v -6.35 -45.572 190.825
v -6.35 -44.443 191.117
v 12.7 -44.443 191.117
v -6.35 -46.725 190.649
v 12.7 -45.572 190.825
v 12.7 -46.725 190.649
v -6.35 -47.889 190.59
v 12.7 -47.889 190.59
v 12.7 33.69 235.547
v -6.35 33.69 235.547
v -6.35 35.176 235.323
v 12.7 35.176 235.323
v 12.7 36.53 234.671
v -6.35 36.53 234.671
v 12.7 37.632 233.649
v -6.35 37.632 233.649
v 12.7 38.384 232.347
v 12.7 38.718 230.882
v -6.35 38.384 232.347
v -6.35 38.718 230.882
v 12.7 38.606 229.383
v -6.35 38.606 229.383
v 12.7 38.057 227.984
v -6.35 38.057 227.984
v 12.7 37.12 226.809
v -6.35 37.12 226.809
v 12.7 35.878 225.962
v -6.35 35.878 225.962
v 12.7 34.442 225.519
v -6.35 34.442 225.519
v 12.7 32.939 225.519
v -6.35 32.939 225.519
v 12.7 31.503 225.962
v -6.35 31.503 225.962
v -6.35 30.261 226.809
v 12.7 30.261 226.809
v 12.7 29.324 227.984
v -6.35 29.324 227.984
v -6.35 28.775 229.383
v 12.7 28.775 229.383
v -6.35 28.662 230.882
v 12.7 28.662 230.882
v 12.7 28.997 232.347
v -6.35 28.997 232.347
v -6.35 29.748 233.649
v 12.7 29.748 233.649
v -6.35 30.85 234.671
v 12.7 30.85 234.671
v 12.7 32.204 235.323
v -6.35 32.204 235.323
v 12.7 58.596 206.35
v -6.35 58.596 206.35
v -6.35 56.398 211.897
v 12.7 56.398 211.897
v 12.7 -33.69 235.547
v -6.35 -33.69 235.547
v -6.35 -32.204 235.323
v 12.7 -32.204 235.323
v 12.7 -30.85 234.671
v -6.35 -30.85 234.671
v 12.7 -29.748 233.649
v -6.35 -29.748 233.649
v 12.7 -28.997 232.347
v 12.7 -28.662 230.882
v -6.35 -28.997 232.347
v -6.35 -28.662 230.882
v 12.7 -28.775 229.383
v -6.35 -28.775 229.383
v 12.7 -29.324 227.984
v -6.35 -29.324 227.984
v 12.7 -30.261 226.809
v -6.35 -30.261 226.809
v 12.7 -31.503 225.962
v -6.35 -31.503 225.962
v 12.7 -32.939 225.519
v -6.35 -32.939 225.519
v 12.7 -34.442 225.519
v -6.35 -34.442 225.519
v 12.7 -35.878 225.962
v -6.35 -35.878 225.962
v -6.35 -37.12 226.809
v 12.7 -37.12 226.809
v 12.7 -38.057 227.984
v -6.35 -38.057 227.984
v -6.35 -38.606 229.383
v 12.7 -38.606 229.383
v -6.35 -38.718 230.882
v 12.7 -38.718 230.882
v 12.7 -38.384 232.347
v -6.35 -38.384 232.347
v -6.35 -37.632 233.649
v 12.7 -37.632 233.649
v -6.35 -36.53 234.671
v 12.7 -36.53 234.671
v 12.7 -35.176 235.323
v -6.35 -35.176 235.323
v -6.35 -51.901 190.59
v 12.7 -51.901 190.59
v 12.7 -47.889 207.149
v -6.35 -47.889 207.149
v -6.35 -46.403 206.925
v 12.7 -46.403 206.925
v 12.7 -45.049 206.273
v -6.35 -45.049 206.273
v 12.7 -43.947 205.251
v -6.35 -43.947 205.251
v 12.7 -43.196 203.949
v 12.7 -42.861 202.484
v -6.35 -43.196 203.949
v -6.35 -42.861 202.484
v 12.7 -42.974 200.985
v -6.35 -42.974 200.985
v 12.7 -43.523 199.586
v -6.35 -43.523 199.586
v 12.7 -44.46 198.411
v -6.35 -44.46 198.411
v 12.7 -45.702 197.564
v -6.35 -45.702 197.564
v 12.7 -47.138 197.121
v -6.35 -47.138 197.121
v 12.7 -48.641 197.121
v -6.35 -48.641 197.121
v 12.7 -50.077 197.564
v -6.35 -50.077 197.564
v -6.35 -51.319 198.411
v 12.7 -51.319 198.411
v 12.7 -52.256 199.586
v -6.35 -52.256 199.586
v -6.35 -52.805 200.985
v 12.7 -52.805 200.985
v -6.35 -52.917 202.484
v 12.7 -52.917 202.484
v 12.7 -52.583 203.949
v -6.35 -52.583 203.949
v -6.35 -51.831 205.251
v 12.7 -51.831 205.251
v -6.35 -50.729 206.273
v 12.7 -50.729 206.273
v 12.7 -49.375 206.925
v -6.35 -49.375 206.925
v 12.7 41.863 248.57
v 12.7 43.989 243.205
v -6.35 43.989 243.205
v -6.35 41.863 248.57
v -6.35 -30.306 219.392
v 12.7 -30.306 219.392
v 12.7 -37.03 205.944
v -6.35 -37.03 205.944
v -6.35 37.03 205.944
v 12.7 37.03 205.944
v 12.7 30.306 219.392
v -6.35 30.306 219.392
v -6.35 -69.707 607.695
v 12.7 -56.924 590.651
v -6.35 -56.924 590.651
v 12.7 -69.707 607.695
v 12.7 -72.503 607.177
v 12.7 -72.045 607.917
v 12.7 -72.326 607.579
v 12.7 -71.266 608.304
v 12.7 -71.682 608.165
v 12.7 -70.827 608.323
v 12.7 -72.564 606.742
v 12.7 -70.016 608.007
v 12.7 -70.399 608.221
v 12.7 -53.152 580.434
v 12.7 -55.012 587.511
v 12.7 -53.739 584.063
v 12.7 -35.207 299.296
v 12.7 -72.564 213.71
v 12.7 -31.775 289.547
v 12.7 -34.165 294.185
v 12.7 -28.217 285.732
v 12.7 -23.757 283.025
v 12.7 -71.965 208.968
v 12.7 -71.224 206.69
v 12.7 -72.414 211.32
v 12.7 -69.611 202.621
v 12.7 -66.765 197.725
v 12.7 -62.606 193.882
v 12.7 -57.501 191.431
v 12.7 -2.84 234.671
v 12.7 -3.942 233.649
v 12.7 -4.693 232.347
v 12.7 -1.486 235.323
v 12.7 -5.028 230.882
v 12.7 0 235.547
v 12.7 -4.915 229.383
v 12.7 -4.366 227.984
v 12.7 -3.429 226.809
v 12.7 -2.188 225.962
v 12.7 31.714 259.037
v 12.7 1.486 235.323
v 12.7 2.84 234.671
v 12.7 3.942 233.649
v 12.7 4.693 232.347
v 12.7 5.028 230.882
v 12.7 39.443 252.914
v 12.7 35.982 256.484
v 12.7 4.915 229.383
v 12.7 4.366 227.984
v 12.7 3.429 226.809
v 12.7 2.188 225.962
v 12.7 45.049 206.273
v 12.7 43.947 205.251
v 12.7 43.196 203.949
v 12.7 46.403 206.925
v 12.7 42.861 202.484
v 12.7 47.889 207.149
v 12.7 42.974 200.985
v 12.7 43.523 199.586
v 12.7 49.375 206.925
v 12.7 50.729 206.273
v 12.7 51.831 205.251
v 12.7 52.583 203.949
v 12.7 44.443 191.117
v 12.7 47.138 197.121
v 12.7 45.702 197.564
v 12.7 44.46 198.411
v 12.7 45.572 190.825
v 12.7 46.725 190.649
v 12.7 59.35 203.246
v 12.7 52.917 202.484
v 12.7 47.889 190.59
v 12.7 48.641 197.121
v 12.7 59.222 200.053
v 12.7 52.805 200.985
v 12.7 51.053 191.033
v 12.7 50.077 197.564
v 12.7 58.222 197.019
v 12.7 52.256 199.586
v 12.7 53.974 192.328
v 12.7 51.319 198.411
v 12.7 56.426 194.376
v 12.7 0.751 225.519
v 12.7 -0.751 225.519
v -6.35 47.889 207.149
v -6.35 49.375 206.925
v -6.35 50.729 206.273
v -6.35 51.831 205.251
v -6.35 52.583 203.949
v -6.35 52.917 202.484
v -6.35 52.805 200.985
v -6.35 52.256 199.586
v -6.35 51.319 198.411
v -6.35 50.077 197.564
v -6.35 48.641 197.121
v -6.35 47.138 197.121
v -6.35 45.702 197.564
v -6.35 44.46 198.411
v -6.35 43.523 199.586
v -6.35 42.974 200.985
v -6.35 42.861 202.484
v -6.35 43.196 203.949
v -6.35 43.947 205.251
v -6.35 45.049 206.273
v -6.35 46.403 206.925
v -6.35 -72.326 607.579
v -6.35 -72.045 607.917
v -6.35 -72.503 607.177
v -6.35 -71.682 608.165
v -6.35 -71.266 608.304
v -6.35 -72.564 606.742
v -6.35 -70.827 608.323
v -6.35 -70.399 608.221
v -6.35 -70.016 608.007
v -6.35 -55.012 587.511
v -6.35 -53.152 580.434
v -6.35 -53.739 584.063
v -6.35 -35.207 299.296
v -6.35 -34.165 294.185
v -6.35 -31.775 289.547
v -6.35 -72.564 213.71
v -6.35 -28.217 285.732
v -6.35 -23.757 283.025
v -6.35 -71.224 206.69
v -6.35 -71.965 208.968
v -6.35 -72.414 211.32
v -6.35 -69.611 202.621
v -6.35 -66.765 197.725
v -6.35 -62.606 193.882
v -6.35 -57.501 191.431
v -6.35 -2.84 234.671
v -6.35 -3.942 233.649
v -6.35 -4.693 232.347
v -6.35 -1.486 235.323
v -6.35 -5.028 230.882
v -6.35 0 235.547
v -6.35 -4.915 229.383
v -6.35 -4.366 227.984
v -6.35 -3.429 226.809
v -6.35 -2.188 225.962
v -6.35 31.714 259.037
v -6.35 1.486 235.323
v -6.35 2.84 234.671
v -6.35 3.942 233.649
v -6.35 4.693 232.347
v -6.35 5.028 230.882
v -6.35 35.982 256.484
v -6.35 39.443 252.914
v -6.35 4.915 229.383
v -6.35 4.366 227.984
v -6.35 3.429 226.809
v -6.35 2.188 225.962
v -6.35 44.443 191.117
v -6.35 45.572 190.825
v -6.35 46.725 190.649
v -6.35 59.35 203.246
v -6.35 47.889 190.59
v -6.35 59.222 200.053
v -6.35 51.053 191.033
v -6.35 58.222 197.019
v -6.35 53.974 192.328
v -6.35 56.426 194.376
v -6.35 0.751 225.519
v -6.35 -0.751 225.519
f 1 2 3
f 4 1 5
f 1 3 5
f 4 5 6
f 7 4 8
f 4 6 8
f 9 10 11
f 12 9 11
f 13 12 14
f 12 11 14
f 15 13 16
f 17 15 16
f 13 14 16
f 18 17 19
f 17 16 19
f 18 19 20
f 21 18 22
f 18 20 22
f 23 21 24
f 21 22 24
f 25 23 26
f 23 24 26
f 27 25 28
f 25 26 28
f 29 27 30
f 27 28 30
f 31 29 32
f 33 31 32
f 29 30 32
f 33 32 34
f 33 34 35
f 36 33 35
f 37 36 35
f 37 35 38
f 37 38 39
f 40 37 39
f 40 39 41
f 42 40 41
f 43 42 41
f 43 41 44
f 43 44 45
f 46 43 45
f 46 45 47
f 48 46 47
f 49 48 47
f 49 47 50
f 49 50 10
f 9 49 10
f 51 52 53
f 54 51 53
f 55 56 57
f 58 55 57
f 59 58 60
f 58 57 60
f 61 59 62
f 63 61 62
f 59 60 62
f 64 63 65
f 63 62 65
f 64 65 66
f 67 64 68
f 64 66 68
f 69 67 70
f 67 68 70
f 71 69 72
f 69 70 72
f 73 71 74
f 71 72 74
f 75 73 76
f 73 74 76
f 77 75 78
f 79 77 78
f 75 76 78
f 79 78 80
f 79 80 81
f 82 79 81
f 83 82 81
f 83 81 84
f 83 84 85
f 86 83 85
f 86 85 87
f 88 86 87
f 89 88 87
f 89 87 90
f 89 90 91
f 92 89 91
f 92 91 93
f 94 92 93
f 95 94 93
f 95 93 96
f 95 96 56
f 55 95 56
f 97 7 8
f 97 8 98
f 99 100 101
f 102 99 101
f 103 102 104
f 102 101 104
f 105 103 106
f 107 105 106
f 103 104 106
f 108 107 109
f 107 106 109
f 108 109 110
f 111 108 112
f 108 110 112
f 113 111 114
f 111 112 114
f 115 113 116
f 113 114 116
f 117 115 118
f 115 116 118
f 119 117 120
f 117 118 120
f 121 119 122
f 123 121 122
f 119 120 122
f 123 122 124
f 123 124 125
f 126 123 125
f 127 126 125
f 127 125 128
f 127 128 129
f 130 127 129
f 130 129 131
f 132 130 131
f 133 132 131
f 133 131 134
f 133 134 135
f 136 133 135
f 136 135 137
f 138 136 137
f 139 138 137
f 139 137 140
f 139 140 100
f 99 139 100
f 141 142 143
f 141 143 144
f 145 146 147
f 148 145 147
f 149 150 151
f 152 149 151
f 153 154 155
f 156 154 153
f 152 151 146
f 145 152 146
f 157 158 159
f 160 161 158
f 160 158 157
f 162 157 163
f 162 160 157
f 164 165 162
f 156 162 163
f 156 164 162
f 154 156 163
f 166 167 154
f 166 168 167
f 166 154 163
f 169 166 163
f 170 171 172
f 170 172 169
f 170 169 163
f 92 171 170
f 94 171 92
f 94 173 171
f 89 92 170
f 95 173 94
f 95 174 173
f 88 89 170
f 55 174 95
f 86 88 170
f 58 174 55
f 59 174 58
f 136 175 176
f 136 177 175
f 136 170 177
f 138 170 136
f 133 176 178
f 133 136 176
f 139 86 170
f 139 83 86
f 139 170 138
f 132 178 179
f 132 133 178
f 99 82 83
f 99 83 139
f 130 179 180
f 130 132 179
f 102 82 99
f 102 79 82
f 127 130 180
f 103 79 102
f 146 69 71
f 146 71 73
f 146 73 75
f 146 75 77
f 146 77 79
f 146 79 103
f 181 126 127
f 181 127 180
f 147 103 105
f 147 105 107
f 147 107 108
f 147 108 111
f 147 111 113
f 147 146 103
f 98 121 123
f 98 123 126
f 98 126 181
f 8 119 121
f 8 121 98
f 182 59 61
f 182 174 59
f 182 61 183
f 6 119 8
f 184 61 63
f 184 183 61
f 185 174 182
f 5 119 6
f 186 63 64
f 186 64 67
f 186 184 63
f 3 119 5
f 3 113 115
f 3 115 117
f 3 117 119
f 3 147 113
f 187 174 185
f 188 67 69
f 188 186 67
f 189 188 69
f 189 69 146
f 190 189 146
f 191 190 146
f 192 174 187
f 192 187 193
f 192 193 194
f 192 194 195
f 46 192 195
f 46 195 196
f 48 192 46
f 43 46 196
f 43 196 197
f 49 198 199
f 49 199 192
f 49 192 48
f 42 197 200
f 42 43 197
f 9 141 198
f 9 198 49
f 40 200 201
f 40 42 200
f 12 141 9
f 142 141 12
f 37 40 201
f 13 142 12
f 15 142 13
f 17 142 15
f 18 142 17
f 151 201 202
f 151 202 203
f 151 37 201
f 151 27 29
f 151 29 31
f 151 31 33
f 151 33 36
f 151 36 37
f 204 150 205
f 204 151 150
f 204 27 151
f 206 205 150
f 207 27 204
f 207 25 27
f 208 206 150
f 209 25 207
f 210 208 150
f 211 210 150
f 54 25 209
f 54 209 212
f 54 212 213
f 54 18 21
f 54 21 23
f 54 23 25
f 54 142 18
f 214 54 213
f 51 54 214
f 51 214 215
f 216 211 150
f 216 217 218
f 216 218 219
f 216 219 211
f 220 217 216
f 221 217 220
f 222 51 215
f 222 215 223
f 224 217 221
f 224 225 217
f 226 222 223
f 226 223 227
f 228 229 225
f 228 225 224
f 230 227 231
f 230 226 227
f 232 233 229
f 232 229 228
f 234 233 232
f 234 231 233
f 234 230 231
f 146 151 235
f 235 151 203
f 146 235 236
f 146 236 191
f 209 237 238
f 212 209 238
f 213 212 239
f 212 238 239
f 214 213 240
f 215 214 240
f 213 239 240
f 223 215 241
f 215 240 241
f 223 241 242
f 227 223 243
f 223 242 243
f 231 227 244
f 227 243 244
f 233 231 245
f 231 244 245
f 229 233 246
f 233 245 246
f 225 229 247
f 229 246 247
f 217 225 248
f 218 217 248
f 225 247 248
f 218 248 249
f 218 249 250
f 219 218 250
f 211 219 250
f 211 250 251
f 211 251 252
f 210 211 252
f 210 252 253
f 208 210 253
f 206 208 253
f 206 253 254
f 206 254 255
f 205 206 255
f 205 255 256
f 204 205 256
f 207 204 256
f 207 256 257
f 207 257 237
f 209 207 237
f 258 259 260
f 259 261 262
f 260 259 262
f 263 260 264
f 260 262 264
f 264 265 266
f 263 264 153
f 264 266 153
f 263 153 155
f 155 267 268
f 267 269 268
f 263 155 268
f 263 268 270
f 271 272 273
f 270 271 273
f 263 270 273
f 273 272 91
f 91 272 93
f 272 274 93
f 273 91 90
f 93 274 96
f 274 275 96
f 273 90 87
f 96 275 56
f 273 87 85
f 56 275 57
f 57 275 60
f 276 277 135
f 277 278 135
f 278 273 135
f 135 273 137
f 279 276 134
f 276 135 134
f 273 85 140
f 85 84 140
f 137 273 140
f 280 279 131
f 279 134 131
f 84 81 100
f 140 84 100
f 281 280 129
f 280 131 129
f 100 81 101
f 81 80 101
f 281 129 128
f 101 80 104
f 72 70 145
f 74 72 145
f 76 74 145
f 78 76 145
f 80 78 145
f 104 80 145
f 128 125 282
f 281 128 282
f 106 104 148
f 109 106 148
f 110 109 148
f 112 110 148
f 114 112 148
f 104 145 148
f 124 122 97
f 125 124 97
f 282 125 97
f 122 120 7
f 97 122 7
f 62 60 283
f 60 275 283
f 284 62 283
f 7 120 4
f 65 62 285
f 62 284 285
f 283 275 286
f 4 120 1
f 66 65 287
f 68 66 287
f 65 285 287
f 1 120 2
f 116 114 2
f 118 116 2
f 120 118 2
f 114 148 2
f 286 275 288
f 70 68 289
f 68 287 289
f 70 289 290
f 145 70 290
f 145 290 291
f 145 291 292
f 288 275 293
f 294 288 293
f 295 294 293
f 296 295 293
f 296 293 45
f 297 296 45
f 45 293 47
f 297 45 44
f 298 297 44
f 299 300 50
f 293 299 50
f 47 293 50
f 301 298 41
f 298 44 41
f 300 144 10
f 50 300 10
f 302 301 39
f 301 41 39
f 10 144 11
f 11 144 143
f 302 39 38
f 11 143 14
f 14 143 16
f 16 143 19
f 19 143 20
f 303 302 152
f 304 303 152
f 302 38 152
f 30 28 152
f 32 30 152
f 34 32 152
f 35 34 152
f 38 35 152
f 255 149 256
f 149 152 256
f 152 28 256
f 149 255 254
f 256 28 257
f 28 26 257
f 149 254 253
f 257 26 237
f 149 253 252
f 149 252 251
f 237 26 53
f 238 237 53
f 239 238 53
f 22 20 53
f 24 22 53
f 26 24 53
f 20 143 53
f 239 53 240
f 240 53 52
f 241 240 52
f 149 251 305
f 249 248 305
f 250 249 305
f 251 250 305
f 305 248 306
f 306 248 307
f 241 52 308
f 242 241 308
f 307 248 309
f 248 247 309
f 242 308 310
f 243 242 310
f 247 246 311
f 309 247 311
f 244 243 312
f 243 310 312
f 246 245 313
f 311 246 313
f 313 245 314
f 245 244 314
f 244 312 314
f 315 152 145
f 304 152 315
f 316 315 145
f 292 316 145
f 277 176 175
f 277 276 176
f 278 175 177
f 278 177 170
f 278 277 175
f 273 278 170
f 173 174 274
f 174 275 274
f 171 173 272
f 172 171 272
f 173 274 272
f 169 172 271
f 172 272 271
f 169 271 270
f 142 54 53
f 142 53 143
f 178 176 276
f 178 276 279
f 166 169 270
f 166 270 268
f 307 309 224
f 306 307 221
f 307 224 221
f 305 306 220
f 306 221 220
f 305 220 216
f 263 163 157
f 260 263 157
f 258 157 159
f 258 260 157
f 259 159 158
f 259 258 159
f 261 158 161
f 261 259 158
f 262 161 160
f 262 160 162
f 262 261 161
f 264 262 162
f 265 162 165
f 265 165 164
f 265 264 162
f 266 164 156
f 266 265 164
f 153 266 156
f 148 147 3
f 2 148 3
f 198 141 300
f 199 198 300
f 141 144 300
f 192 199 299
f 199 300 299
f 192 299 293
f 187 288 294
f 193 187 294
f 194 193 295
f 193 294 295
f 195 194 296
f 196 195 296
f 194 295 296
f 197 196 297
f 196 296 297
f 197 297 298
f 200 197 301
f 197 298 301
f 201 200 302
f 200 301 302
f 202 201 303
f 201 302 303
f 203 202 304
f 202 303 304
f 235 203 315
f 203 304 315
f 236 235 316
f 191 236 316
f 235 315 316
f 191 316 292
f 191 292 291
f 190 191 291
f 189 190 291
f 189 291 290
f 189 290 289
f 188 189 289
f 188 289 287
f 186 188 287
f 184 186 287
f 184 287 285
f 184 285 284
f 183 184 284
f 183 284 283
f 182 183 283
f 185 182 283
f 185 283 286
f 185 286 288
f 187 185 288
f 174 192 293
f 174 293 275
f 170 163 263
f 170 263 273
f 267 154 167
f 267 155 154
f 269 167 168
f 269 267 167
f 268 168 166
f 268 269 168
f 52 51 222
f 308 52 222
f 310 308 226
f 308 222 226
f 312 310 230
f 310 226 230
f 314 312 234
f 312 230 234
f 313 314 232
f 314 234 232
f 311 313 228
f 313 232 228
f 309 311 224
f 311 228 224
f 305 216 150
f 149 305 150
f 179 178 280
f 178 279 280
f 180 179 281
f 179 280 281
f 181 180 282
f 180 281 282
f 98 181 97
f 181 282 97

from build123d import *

# Parameters (mm, degrees)
SKETCH1_R               = 7.9375
SKETCH1_R_2             = 11.1125
BOSS_EXTRUDE1_DEPTH     = 12.7
F_8_CLEARANCE_HOLE1_D   = 4.4958
SKETCH5_R               = 18.415
CUT_EXTRUDE1_DEPTH      = 13.7
SKETCH7_R               = 9.525
CUT_EXTRUDE2_DEPTH      = 13.7
CUT_EXTRUDE3_DEPTH      = 13.7
BOSS_EXTRUDE2_DEPTH     = 12.7
CUT_EXTRUDE4_DEPTH      = 13.7
SKETCH11_W              = 12.7
SKETCH11_H              = 178.054
CUT_EXTRUDE5_DEPTH      = 3.175
BOSS_EXTRUDE3_DEPTH     = 19.05
CUT_EXTRUDE6_DEPTH      = 20.05
F_3_8_CLEARANCE_HOLE1_D = 10.0838
CUT_EXTRUDE7_DEPTH      = 20.05
BOSS_EXTRUDE4_DEPTH     = 19.05
FILLET1_R               = 19.05
FILLET3_R               = 1.5875


with BuildPart() as part:
    # Sketch1 → Boss-Extrude1 (new body)
    with BuildSketch(Plane(origin=(0, 0, 0), x_dir=(0, 0, -1), z_dir=(1, 0, 0))):
        with BuildLine():
            Line((93.345, 0), (55.245, 50.8))
            Line((55.245, 50.8), (-160.655, 50.8))
            ThreePointArc((-160.655, 50.8), (-211.455, 0), (-160.655, -50.8))
            Line((-160.655, -50.8), (55.245, -50.8))
            Line((55.245, -50.8), (93.345, 0))
        make_face()
        with Locations((-88.9, 0)):
            Circle(SKETCH1_R, mode=Mode.SUBTRACT)
        with Locations((-38.1, 0)):
            Circle(SKETCH1_R, mode=Mode.SUBTRACT)
        with Locations((-160.655, 0)):
            Circle(SKETCH1_R_2, mode=Mode.SUBTRACT)
        Circle(SKETCH1_R, mode=Mode.SUBTRACT)
    extrude(amount=BOSS_EXTRUDE1_DEPTH)

    # #8 Clearance Hole1 (through all)
    with Locations(Plane.ZY):
        with Locations((-17.691104559, 17.691104559), (17.691104559, 17.691104559), (17.691104559, -17.691104559), (-17.691104559, -17.691104559)):
            Hole(F_8_CLEARANCE_HOLE1_D / 2)

    # Sketch5 → Cut-Extrude1 (cut, through all)
    with BuildSketch(Plane.ZY):
        Circle(SKETCH5_R)
    extrude(amount=-CUT_EXTRUDE1_DEPTH, mode=Mode.SUBTRACT)

    # Sketch7 → Cut-Extrude2 (cut, through all)
    with BuildSketch(Plane.ZY):
        with Locations((-55.245, 0)):
            Circle(SKETCH7_R)
    extrude(amount=-CUT_EXTRUDE2_DEPTH, mode=Mode.SUBTRACT)

    # Sketch8 → Cut-Extrude3 (cut, through all)
    with BuildSketch(Plane(origin=(12.7, 0, 0), x_dir=(0, 0, -1), z_dir=(1, 0, 0))):
        Polygon((-160.655, 50.8), (-211.455, 25.4), (-211.455, -25.4), (-160.655, -50.8), (-233.239745749, -50.8), (-233.239745749, 50.8), align=None)
    extrude(amount=-CUT_EXTRUDE3_DEPTH, mode=Mode.SUBTRACT)

    # Sketch9 → Boss-Extrude2 (add)
    with BuildSketch(Plane(origin=(12.7, 0, 0), x_dir=(0, 0, -1), z_dir=(1, 0, 0))):
        Polygon((-160.655, 50.8), (-211.455, 25.4), (-211.455, 0), (-211.455, -25.4), (-160.655, -50.8), (-160.655, -40.64), (-202.749323348, 0), (-160.655, 40.64), align=None)
    extrude(amount=-BOSS_EXTRUDE2_DEPTH)

    # Sketch10 → Cut-Extrude4 (cut, through all)
    with BuildSketch(Plane.ZY):
        Polygon((-79.0575, -19.05), (-79.0575, 19.05), (-93.345, 0), align=None)
    extrude(amount=-CUT_EXTRUDE4_DEPTH, mode=Mode.SUBTRACT)

    # Sketch11 → Cut-Extrude5 (cut)
    with BuildSketch(Plane(origin=(0, 50.8, 0), x_dir=(1, 0, 0), z_dir=(0, 1, 0))):
        with Locations((6.35, -52.705)):
            Rectangle(SKETCH11_W, SKETCH11_H)
    cut_extrude5 = extrude(amount=-CUT_EXTRUDE5_DEPTH, mode=Mode.SUBTRACT)

    # Mirror1: Cut-Extrude5 across plane
    add(cut_extrude5.mirror(Plane.ZX), mode=Mode.SUBTRACT)

    # Sketch13 → Cut-Extrude6 (cut, through all)
    with BuildSketch(Plane(origin=(12.7, 0, 0), x_dir=(0, 0, -1), z_dir=(1, 0, 0))):
        Polygon((-161.254612663, -53.34), (-139.192, -53.34), (-139.192, -50.165), (33.782, -50.165), (33.782, -53.34), (56.515, -53.34), (81.5975, -19.896666667), (81.5975, 19.896666667), (56.515, 53.34), (33.782, 53.34), (33.782, 50.165), (-139.192, 50.165), (-139.192, 53.34), (-161.254612663, 53.34), (-213.995, 26.969806331), (-213.995, -26.969806331), align=None)
    extrude(amount=-CUT_EXTRUDE6_DEPTH, mode=Mode.SUBTRACT)


with BuildPart() as body_2:
    # Sketch12 → Boss-Extrude3 (new body)
    with BuildSketch(Plane(origin=(12.7, 0, 0), x_dir=(0, 0, -1), z_dir=(1, 0, 0))):
        with BuildLine():
            ThreePointArc((-211.89681554, -56.397839854), (-236.855, 0), (-211.89681554, 56.397839854))
            Line((-211.89681554, 56.397839854), (-243.205, 43.989212666))
            Line((-243.205, 43.989212666), (-243.205, -43.989212666))
            Line((-243.205, -43.989212666), (-211.89681554, -56.397839854))
        make_face()
        with BuildLine():
            Line((-217.805, 29.324515829), (-162.154031657, 57.15))
            Line((-162.154031657, 57.15), (-166.916531657, 66.675))
            Line((-166.916531657, 66.675), (-185.966531657, 66.675))
            Line((-185.966531657, 66.675), (-211.89681554, 56.397839854))
            ThreePointArc((-211.89681554, 56.397839854), (-236.855, 0), (-211.89681554, -56.397839854))
            Line((-211.89681554, -56.397839854), (-185.966531657, -66.675))
            Line((-185.966531657, -66.675), (-166.916531657, -66.675))
            Line((-166.916531657, -66.675), (-162.154031657, -57.15))
            Line((-162.154031657, -57.15), (-217.805, -29.324515829))
            Line((-217.805, -29.324515829), (-217.805, 29.324515829))
        make_face()
    extrude(amount=-BOSS_EXTRUDE3_DEPTH)

    # 3/8 Clearance Hole1 (through all)
    with Locations(Plane(origin=(12.7, 0, 0), x_dir=(0, 0, -1), z_dir=(1, 0, 0))):
        with Locations((-230.505, 0), (-230.505, 33.690140829), (-202.106936686, 47.889172486), (-230.505, -33.690140829), (-202.106936686, -47.889172486)):
            Hole(F_3_8_CLEARANCE_HOLE1_D / 2)

    # Sketch16 → Cut-Extrude7 (cut, through all)
    with BuildSketch(Plane(origin=(12.7, 0, 0), x_dir=(0, 0, -1), z_dir=(1, 0, 0))):
        with BuildLine():
            ThreePointArc((-190.589767426, 47.889172486), (-190.722432786, 46.146112328), (-191.117372542, 44.443208515))
            Line((-191.117372542, 44.443208515), (-162.86398324, 58.569903166))
            Line((-162.86398324, 58.569903166), (-166.916531657, 66.675))
            Line((-166.916531657, 66.675), (-185.966531657, 66.675))
            Line((-185.966531657, 66.675), (-206.35048523, 58.596062021))
            ThreePointArc((-206.35048523, 58.596062021), (-195.635015761, 57.415946719), (-190.589767426, 47.889172486))
        make_face()
        with BuildLine():
            Line((-162.86398324, 58.569903166), (-191.117372542, 44.443208515))
            ThreePointArc((-191.117372542, 44.443208515), (-191.551739911, 43.281243579), (-192.108559765, 42.172735946))
            Line((-192.108559765, 42.172735946), (-162.154031657, 57.15))
            Line((-162.154031657, 57.15), (-162.86398324, 58.569903166))
        make_face()
        with BuildLine():
            Line((-191.117372542, 44.443208515), (-205.943903995, 37.029942788))
            ThreePointArc((-205.943903995, 37.029942788), (-204.753711625, 36.680257722), (-203.532813606, 36.460609025))
            Line((-203.532813606, 36.460609025), (-192.108559765, 42.172735946))
            ThreePointArc((-192.108559765, 42.172735946), (-191.551739911, 43.281243579), (-191.117372542, 44.443208515))
        make_face()
        with BuildLine():
            Line((-219.3925, 30.305644786), (-219.3925, -30.305644786))
            Line((-219.3925, -30.305644786), (-205.943903995, -37.029942788))
            ThreePointArc((-205.943903995, -37.029942788), (-204.753711625, -36.680257722), (-203.532813606, -36.460609025))
            Line((-203.532813606, -36.460609025), (-217.805, -29.324515829))
            Line((-217.805, -29.324515829), (-217.805, 29.324515829))
            Line((-217.805, 29.324515829), (-203.532813606, 36.460609025))
            ThreePointArc((-203.532813606, 36.460609025), (-204.753711625, 36.680257722), (-205.943903995, 37.029942788))
            Line((-205.943903995, 37.029942788), (-219.3925, 30.305644786))
        make_face()
        with BuildLine():
            ThreePointArc((-203.532813606, -36.460609025), (-204.753711625, -36.680257722), (-205.943903995, -37.029942788))
            Line((-205.943903995, -37.029942788), (-191.117372542, -44.443208515))
            ThreePointArc((-191.117372542, -44.443208515), (-191.551739911, -43.281243579), (-192.108559765, -42.172735946))
            Line((-192.108559765, -42.172735946), (-203.532813606, -36.460609025))
        make_face()
        with BuildLine():
            ThreePointArc((-192.108559765, -42.172735946), (-191.551739911, -43.281243579), (-191.117372542, -44.443208515))
            Line((-191.117372542, -44.443208515), (-162.86398324, -58.569903166))
            Line((-162.86398324, -58.569903166), (-162.154031657, -57.15))
            Line((-162.154031657, -57.15), (-192.108559765, -42.172735946))
        make_face()
        with BuildLine():
            Line((-162.86398324, -58.569903166), (-191.117372542, -44.443208515))
            ThreePointArc((-191.117372542, -44.443208515), (-190.722432786, -46.146112328), (-190.589767426, -47.889172486))
            Line((-190.589767426, -47.889172486), (-190.589767426, -64.842635395))
            Line((-190.589767426, -64.842635395), (-185.966531657, -66.675))
            Line((-185.966531657, -66.675), (-166.916531657, -66.675))
            Line((-166.916531657, -66.675), (-162.86398324, -58.569903166))
        make_face()
    extrude(amount=-CUT_EXTRUDE7_DEPTH, mode=Mode.SUBTRACT)

    # Sketch17 → Boss-Extrude4 (add)
    with BuildSketch(Plane(origin=(12.7, 0, 0), x_dir=(0, 0, -1), z_dir=(1, 0, 0))):
        Polygon((-490.855, -72.564212666), (-210.072064852, -72.564212666), (-190.589767426, -64.842635395), (-243.205, -43.989212666), (-243.205, 43.989212666), (-255.905, 38.955718453), (-287.655, -34.464212666), (-586.105, -53.514212666), (-611.505, -72.564212666), (-497.205, -72.564212666), align=None)
    extrude(amount=-BOSS_EXTRUDE4_DEPTH)

    # Fillet1
    fillet1_edges = [body_2.edges().sort_by_distance(p)[0] for p in [
        (3.175, -72.564212666, 210.072064852),
        (3.175, -53.514212666, 586.105),
        (3.175, -34.464212666, 287.655),
        (3.175, 38.955718453, 255.905),
        (3.175, -64.842635395, 190.589767426),
    ]]
    fillet(fillet1_edges, radius=FILLET1_R)

    # Fillet3
    fillet3_edges = [body_2.edges().sort_by_distance(p)[0] for p in [
        (3.175, -72.564212666, 611.505),
    ]]
    fillet(fillet3_edges, radius=FILLET3_R)


solid = body_2.part
